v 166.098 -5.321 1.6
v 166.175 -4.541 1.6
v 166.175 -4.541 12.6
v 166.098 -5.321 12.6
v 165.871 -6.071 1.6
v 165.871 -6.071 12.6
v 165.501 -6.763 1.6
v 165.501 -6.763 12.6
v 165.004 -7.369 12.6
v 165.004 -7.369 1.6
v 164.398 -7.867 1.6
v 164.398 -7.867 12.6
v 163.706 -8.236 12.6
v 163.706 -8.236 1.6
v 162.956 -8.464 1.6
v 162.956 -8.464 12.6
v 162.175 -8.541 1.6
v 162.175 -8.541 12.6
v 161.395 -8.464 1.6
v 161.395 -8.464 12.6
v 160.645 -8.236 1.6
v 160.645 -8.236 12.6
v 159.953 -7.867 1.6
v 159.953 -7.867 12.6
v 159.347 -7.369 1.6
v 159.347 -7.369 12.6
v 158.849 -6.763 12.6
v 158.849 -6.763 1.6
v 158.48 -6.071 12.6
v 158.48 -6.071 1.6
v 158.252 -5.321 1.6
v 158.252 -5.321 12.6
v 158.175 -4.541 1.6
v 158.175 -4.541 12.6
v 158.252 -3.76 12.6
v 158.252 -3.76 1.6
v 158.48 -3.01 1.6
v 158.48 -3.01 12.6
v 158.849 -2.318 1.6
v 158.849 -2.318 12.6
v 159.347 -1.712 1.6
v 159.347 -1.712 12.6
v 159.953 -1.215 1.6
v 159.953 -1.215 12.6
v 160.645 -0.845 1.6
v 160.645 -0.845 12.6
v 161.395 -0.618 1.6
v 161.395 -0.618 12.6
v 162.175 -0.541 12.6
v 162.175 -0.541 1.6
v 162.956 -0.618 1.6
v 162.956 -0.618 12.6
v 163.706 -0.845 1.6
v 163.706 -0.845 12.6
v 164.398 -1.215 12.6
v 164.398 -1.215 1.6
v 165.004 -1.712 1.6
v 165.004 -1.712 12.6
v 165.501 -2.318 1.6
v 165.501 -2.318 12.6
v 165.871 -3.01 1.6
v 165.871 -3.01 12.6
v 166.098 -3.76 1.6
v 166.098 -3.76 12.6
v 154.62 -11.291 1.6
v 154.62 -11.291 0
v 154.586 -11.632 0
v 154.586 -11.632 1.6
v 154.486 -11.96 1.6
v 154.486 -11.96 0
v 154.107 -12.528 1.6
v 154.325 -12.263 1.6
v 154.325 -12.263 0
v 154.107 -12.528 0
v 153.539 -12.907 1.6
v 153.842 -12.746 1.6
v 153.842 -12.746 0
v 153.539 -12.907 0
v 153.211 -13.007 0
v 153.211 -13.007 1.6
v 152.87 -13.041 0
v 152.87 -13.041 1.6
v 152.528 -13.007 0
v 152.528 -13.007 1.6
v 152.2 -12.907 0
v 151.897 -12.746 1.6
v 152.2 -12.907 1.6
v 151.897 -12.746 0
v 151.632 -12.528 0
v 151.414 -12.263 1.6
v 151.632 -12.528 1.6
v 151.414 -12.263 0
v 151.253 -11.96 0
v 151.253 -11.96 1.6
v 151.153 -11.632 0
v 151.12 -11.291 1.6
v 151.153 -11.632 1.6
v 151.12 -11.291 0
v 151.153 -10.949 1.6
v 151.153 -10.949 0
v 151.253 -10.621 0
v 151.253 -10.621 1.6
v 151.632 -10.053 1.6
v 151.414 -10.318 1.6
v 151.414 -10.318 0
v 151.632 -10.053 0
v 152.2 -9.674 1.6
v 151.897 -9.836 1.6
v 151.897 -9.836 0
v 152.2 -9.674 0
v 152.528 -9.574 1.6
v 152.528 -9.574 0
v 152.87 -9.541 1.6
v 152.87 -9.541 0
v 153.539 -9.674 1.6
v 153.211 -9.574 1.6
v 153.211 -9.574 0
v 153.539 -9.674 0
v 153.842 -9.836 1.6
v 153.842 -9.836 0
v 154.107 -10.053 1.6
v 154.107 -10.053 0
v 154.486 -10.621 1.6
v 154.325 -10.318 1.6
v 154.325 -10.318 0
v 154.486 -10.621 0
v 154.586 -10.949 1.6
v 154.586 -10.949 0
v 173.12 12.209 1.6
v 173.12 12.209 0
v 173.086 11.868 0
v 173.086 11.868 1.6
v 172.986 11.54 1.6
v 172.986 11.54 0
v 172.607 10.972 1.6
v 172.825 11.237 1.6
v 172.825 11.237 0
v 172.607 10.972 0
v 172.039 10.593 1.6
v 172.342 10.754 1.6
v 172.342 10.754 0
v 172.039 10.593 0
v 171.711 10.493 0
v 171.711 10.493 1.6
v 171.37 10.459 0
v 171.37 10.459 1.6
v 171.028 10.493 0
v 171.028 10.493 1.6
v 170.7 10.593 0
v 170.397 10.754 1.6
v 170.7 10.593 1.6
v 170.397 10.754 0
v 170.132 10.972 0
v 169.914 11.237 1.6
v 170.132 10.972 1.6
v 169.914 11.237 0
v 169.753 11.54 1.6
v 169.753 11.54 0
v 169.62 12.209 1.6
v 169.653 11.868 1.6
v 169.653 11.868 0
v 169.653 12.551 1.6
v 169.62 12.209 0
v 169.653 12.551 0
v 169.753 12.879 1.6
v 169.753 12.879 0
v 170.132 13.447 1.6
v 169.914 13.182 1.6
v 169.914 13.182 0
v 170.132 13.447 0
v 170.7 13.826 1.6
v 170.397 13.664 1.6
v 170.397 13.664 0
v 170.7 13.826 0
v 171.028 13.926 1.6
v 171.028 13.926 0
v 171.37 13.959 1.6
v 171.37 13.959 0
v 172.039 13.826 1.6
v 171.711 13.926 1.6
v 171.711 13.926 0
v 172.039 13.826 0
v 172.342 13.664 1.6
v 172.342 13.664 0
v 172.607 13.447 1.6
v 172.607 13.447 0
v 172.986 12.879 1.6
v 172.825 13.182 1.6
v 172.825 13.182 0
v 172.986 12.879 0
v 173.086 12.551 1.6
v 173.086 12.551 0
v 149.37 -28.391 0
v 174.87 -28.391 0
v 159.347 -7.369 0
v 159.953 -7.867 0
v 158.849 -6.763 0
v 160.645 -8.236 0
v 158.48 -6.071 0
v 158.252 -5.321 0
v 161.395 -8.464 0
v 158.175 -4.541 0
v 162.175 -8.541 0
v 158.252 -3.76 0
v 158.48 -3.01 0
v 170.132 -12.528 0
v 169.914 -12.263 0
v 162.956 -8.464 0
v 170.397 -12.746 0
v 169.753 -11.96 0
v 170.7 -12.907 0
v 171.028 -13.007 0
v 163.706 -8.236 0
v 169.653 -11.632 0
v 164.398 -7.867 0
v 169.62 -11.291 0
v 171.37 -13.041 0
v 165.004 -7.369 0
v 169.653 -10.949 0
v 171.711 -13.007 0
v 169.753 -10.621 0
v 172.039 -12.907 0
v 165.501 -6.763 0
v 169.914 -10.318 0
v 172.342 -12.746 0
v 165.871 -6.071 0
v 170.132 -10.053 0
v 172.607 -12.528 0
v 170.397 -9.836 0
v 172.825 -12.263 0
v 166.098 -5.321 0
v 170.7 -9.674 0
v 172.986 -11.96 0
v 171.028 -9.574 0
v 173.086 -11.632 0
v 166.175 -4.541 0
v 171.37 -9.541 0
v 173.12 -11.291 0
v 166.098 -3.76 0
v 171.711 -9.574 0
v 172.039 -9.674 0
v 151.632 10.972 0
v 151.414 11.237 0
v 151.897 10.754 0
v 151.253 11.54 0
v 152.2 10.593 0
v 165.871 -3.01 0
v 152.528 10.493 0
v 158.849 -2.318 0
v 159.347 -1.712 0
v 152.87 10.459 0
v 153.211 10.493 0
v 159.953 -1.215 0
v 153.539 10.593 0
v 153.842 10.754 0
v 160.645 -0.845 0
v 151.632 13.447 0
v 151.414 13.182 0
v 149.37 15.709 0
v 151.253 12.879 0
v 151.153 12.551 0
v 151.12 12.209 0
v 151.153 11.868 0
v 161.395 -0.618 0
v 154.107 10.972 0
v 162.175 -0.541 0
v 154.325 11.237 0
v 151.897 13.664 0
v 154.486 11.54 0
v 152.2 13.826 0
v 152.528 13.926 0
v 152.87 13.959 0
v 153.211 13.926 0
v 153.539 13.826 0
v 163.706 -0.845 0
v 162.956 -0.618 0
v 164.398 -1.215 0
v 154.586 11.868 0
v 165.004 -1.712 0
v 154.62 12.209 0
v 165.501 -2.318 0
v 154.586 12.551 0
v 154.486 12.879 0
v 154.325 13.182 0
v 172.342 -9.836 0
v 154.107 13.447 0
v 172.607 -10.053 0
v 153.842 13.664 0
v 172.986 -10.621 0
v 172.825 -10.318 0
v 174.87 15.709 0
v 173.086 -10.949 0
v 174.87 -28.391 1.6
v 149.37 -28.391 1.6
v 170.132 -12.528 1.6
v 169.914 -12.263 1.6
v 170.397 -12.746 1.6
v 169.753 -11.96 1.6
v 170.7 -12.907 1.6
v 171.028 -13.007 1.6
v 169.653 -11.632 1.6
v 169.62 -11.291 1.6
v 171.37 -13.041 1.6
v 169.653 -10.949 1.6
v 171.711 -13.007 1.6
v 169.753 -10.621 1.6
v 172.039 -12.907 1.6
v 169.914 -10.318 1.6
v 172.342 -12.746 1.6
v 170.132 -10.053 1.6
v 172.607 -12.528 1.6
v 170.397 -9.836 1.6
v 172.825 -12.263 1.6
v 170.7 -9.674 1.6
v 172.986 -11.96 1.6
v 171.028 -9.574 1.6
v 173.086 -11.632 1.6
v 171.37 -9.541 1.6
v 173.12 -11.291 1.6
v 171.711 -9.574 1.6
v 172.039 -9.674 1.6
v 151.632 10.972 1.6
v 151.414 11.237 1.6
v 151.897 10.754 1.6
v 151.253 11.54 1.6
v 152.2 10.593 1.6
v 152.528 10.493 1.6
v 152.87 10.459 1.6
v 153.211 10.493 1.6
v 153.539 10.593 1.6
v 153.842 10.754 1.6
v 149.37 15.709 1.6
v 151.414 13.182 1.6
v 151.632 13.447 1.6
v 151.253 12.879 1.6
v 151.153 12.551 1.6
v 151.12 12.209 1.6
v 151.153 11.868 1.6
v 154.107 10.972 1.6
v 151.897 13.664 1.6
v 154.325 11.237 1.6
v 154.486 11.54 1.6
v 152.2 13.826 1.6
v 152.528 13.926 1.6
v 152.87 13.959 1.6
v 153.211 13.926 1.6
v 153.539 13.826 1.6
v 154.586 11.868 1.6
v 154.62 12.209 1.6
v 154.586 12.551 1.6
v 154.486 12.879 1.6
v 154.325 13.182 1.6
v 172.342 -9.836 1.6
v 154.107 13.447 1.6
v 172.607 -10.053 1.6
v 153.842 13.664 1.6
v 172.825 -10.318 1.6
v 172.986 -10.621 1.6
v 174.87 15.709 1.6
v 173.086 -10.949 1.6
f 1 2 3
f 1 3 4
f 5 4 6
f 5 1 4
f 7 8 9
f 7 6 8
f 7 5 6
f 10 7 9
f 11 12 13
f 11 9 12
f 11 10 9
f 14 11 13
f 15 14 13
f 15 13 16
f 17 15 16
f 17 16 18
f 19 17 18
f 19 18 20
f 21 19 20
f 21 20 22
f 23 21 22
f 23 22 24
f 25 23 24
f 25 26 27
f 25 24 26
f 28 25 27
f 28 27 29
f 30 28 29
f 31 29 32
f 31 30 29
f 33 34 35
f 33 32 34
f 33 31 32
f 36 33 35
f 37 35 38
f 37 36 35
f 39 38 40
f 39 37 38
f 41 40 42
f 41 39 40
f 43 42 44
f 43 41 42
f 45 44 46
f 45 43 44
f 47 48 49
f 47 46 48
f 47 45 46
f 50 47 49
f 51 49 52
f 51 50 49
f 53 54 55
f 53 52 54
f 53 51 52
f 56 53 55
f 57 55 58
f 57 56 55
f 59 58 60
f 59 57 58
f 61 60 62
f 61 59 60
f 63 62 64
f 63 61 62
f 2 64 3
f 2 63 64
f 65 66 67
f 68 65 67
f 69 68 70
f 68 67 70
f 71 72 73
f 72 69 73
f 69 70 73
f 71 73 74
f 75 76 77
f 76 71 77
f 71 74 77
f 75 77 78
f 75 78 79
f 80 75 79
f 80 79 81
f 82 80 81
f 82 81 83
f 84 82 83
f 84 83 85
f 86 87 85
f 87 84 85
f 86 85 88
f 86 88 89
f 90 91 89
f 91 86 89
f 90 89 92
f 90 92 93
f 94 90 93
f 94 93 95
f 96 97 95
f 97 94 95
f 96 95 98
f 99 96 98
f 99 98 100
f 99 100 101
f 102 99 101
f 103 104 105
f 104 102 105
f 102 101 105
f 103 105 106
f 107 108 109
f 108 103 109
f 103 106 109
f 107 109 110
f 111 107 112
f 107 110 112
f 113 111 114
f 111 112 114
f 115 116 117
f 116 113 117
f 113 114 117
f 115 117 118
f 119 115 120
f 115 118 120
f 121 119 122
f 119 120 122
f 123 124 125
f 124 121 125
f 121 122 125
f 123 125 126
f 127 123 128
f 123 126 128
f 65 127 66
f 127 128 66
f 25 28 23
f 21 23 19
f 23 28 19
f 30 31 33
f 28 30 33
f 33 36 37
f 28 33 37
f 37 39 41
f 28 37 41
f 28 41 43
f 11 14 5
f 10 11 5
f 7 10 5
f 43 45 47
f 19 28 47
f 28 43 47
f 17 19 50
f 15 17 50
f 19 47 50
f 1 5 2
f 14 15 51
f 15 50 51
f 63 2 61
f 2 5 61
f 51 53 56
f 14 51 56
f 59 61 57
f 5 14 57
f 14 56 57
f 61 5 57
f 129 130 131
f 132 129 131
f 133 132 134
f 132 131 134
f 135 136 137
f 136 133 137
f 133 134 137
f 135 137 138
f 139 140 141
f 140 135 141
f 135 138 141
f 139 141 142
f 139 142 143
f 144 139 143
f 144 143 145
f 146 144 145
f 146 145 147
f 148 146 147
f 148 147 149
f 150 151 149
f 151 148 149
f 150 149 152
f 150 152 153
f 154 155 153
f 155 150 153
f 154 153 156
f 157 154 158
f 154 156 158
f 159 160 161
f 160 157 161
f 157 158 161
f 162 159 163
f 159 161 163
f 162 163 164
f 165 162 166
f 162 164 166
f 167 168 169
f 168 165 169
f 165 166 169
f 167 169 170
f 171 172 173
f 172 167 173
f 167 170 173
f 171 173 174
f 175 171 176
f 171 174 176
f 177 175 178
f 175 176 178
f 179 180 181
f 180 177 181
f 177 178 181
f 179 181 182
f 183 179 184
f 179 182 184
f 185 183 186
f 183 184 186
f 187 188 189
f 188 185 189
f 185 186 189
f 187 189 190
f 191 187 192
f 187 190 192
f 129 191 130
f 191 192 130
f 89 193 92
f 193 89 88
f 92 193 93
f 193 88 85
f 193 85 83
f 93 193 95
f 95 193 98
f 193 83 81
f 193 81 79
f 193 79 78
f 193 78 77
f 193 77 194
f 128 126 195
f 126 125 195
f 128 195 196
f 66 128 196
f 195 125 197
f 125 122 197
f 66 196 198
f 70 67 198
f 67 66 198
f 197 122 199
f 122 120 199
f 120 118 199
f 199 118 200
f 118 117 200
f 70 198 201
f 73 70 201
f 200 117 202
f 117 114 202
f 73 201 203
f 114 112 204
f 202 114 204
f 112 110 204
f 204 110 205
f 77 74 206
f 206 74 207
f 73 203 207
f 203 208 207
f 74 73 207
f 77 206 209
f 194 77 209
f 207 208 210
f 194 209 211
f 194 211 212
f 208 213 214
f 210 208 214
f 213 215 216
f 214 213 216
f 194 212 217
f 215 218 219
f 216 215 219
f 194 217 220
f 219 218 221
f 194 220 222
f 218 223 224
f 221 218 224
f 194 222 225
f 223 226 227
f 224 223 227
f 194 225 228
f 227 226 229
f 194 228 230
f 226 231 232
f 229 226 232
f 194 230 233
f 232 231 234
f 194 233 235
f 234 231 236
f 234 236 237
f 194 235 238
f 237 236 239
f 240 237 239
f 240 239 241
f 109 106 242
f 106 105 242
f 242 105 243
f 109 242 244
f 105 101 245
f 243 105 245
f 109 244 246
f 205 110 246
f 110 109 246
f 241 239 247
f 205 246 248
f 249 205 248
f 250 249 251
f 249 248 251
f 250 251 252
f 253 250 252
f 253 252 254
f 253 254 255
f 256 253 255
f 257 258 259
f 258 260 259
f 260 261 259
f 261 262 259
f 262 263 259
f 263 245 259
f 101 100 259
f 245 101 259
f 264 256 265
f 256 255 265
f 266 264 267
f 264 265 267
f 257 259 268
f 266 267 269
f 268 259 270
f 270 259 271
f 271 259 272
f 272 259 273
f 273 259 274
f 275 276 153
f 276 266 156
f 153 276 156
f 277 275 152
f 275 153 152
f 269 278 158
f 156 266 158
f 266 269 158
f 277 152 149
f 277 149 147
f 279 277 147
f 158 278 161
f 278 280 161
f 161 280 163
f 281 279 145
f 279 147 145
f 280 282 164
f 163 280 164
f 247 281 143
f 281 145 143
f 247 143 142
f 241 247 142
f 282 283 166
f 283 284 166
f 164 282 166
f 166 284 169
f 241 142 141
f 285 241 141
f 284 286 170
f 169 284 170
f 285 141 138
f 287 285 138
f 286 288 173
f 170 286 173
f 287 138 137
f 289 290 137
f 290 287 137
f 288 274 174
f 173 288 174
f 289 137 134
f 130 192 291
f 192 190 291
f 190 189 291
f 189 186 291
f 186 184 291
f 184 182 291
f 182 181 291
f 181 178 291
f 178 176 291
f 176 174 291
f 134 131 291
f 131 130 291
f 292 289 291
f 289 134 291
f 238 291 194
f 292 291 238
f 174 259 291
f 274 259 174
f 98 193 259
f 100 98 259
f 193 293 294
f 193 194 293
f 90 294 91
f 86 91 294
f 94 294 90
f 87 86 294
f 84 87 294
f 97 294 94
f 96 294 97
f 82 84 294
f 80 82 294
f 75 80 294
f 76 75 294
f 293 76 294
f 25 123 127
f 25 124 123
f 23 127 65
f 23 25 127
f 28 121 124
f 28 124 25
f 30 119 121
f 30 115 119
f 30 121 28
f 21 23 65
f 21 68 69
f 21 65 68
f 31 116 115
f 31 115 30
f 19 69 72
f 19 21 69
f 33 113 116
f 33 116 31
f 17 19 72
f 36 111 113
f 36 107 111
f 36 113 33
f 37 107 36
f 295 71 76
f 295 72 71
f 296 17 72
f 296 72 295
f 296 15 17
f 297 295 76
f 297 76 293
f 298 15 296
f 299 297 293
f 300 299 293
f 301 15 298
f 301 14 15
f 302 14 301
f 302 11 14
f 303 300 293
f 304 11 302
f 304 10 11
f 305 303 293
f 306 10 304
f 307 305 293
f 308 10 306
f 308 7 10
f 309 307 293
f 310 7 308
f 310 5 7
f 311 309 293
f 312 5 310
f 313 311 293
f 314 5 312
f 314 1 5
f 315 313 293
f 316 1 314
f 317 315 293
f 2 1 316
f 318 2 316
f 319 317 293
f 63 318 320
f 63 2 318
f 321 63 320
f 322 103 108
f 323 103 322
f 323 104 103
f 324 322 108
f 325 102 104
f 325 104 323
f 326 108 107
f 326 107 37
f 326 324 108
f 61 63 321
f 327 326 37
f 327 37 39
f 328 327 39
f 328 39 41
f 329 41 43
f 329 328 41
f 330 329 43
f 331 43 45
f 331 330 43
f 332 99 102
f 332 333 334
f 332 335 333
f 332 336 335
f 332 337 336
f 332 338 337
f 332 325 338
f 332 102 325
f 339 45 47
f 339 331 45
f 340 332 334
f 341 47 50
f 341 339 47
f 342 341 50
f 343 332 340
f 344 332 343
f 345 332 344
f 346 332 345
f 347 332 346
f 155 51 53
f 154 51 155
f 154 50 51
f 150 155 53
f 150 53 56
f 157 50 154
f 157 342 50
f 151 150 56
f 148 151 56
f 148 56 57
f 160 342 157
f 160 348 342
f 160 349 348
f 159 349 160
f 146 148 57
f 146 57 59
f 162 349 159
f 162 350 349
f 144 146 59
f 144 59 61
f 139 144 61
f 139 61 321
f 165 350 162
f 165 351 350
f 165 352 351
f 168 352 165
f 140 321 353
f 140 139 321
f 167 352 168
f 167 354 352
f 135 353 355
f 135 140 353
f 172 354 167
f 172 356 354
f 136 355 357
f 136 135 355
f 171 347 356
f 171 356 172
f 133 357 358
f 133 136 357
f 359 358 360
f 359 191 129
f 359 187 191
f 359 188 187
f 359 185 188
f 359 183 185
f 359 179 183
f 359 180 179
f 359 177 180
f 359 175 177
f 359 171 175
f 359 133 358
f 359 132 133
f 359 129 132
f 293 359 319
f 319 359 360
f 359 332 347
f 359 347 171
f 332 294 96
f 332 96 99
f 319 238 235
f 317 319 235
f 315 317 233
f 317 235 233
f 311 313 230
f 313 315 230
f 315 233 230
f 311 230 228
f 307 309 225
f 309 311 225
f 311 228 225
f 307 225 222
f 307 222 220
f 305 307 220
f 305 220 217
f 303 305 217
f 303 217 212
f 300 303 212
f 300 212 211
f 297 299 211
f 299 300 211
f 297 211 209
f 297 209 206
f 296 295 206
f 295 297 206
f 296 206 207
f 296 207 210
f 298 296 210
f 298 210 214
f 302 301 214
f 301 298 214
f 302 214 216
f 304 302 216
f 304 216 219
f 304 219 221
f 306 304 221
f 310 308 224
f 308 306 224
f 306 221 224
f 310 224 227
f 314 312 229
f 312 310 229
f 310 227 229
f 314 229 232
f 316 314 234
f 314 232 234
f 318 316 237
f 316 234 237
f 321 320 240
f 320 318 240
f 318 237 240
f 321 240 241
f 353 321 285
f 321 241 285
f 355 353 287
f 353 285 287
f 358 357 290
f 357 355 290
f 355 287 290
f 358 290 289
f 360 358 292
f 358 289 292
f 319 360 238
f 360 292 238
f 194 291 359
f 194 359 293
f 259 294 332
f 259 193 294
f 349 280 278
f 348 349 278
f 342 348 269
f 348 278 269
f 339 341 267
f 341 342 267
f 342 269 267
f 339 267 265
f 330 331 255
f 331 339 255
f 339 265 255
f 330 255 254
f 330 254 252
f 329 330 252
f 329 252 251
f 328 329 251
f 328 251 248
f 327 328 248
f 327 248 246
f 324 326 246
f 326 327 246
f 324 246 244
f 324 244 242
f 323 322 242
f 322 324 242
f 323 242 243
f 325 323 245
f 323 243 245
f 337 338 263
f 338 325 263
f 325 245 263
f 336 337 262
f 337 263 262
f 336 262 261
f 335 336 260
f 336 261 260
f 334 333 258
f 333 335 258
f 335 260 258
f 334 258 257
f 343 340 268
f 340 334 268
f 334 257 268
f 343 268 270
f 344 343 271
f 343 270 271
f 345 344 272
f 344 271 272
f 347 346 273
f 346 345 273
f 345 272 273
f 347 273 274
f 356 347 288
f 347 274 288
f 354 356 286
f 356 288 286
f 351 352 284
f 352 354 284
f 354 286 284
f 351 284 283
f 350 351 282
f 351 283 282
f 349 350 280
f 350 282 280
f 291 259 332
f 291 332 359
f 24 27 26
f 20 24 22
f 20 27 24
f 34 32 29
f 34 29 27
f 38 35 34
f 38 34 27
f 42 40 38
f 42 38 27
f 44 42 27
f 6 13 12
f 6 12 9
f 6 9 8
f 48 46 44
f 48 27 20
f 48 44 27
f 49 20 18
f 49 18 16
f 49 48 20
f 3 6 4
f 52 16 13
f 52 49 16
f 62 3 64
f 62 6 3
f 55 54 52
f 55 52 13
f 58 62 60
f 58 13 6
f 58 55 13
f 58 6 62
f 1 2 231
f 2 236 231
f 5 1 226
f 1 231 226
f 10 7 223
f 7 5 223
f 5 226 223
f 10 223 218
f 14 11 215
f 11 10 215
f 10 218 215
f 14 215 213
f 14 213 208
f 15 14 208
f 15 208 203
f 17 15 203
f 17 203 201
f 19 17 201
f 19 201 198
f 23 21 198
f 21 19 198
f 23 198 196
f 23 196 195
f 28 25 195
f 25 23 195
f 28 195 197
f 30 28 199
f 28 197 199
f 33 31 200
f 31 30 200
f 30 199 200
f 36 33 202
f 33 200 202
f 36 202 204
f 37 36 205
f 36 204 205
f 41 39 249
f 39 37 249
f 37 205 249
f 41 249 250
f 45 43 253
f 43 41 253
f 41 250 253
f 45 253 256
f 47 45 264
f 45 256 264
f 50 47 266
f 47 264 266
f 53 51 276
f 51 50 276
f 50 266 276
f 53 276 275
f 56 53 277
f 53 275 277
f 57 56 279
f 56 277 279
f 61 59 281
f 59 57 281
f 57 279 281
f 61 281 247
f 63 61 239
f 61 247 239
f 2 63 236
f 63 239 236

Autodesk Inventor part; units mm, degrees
ref_plane "YZ Plane" through (0, 0, 0) normal (1, 0, 0) x (0, 1, 0)
ref_plane "XZ Plane" through (0, 0, 0) normal (0, 1, 0) x (-1, 0, 0)
ref_plane "XY Plane" through (0, 0, 0) normal (0, 0, 1) x (1, 0, 0)
sketch "Sketch1" plane through (0, 0, 0) normal (0, 0, 1) x (1, 0, 0)
  line L0 (149.3695, 15.7093) -> (174.8695, 15.7093)
  line L1 (174.8695, 15.7093) -> (174.8695, -28.3907)
  line L2 (174.8695, -28.3907) -> (149.3695, -28.3907)
  line L3 (149.3695, -28.3907) -> (149.3695, 15.7093)
  circle A0 centre (152.8695, 12.2093) radius 1.75
  circle A1 centre (171.3695, 12.2093) radius 1.75
  circle A2 centre (152.8695, -11.2907) radius 1.75
  circle A3 centre (171.3695, -11.2907) radius 1.75
  line L4 (162.1195, 21.9473) -> (162.1195, -33.4191) construction
  line L5 (144.2972, -9.7907) -> (180.3541, -9.7907) construction
  line L6 (143.6152, 0.7093) -> (182.6159, 0.7093) construction
  line L7 (156.6972, 0.7093) -> (167.6534, 0.7093) construction
  line L8 (167.6534, 0.7093) -> (167.6534, -9.7907) construction
  line L9 (167.6534, -9.7907) -> (156.6972, -9.7907) construction
  line L10 (156.6972, -9.7907) -> (156.6972, 0.7093) construction
  line L11 (156.6972, -4.5407) -> (167.6534, -4.5407) construction
  circle A4 centre (162.1753, -4.5407) radius 4
  point P0 (0, 0)
  dimension "d0" = 44.1
  dimension "d1" = 25.5
  dimension "d2" = 3.5
  dimension "d3" = 3.5
  dimension "d4" = 3.5
  dimension "d5" = 3.5
  dimension "d6" = 3.5
  dimension "d7" = 3.5
  dimension "d8" = 3.5
  dimension "d9" = 3.5
  dimension "d10" = 27
  dimension "d11" = 27
  dimension "d12" = 25.5
  dimension "d13" = 10.5
  dimension "d14" = 8
extrude "Extrusion1" add sketch "Sketch1" along normal blind 1.6
sketch "Sketch2" plane through (0, 0, 1.6) normal (0, 0, 1) x (1, 0, 0)
  circle A0 centre (162.1753, -4.5407) radius 4 projected
  point P0 (0, 0)
extrude "Extrusion2" add sketch "Sketch2" along normal blind 11
properties part number "joystick"
